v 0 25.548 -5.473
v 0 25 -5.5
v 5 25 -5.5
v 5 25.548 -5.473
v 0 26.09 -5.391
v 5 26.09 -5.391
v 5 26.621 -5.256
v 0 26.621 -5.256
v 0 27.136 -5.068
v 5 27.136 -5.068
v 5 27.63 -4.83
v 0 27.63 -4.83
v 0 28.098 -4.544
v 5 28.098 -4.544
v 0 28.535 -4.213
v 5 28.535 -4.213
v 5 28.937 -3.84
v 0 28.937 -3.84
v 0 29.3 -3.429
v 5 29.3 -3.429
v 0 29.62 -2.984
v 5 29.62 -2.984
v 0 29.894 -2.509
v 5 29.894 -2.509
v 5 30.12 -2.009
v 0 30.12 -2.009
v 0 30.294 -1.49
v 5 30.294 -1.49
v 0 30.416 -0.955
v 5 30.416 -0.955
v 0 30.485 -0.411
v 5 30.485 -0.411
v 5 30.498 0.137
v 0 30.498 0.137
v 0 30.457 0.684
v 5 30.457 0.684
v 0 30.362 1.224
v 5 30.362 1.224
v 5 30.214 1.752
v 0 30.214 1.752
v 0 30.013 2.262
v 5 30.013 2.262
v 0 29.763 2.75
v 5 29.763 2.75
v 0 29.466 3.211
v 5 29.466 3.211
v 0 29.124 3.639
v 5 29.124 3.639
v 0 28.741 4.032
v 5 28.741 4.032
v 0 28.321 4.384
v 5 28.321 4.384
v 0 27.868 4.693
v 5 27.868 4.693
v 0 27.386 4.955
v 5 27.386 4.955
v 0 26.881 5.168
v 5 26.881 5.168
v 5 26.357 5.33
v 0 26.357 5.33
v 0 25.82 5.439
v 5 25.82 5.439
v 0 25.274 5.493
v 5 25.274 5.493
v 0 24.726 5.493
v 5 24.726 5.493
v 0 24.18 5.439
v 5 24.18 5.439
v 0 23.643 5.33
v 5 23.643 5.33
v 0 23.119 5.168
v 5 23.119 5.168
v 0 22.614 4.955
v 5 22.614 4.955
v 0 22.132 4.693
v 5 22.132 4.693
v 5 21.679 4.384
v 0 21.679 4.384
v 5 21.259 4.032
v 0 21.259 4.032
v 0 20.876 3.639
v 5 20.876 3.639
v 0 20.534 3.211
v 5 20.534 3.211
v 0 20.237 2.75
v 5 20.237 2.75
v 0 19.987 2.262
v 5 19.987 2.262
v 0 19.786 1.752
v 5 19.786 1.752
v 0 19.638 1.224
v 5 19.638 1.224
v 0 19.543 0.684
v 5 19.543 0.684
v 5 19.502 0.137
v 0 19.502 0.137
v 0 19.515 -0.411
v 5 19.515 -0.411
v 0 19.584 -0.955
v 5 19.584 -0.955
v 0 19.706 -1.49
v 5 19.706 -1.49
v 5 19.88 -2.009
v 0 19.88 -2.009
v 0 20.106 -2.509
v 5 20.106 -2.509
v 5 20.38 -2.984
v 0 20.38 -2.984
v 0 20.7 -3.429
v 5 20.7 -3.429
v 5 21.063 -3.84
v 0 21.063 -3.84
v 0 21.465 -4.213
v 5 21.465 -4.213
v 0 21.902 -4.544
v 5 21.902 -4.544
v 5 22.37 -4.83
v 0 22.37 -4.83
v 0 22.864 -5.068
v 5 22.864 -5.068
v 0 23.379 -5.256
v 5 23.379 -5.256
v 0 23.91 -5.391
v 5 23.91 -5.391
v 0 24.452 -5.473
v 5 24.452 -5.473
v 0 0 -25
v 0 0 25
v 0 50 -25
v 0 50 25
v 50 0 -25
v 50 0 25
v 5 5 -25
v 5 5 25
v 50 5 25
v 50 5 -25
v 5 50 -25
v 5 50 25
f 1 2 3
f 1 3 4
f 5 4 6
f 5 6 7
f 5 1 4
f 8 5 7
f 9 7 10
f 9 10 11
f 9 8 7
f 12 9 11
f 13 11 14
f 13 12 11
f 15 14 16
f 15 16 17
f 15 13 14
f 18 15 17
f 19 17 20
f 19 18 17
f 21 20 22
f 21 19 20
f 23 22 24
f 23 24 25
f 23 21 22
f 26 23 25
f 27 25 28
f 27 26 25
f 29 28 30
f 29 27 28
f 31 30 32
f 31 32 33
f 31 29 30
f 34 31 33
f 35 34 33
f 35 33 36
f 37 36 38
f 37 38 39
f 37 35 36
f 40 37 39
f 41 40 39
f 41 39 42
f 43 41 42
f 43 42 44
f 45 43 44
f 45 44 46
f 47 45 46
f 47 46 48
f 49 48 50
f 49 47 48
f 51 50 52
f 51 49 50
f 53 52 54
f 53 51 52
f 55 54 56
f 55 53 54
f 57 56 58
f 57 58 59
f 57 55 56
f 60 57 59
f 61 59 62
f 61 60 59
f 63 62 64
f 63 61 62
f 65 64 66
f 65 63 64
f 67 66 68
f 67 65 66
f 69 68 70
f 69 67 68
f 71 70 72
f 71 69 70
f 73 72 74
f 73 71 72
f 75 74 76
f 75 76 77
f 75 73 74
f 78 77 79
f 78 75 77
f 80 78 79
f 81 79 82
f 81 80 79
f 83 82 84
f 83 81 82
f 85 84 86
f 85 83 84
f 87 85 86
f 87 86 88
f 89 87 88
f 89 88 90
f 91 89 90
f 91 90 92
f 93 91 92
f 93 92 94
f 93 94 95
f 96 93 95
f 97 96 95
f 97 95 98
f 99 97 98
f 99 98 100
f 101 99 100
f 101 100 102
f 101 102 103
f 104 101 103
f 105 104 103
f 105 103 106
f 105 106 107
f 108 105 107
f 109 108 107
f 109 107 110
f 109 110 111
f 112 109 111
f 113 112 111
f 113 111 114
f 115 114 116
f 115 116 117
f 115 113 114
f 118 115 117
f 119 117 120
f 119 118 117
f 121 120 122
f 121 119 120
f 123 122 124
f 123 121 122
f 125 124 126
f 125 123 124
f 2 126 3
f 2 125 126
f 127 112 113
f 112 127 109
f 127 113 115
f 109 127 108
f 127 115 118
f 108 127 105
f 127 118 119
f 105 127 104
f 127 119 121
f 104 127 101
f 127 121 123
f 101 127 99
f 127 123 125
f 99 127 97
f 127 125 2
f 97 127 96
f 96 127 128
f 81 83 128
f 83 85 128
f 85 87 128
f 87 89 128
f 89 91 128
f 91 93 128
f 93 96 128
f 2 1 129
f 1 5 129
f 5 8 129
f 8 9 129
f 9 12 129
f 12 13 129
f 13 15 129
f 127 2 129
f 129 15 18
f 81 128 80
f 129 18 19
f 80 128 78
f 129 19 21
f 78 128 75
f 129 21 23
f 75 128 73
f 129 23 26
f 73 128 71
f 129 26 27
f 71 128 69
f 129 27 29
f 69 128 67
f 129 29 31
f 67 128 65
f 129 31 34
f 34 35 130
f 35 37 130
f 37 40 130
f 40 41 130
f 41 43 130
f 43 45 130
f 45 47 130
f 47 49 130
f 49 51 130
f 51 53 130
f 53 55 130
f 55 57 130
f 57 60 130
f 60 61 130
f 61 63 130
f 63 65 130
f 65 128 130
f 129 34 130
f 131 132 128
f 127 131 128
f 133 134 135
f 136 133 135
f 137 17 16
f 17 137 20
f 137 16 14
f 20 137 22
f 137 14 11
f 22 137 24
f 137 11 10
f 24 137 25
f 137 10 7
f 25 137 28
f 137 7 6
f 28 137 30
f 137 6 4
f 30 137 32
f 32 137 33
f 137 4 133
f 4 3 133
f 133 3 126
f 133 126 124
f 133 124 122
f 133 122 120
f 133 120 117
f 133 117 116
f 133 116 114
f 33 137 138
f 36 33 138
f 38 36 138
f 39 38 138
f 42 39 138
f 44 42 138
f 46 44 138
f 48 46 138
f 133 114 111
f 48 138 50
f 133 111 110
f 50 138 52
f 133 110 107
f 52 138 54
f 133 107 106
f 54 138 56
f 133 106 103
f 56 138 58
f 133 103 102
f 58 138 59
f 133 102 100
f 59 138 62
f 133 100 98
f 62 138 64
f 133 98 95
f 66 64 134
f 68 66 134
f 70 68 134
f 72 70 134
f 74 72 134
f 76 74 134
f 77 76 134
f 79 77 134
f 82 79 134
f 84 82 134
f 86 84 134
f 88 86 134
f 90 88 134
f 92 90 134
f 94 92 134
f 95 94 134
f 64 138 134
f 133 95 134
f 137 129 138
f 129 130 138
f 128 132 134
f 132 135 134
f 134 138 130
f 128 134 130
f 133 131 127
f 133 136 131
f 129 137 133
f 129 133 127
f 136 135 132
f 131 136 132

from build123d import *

# Parameters (mm, degrees)
EXTRUDE_THIN1_DEPTH = 25
SKETCH2_R           = 5.5
CUT_EXTRUDE1_DEPTH  = 5


with BuildPart() as part:
    # Sketch1 → Extrude-Thin1 (new, symmetric)
    with BuildSketch(Plane.XY):
        Polygon((50, 0), (0, 0), (0, 50), (5, 50), (5, 5), (50, 5), align=None)
    extrude(amount=EXTRUDE_THIN1_DEPTH, both=True)

    # Sketch2 → Cut-Extrude1 (cut)
    with BuildSketch(Plane.YZ):
        with Locations(Location((25, 0, 0), (0, 0, 270))):
            Circle(SKETCH2_R)
    extrude(amount=CUT_EXTRUDE1_DEPTH, mode=Mode.SUBTRACT)


solid = part.part
